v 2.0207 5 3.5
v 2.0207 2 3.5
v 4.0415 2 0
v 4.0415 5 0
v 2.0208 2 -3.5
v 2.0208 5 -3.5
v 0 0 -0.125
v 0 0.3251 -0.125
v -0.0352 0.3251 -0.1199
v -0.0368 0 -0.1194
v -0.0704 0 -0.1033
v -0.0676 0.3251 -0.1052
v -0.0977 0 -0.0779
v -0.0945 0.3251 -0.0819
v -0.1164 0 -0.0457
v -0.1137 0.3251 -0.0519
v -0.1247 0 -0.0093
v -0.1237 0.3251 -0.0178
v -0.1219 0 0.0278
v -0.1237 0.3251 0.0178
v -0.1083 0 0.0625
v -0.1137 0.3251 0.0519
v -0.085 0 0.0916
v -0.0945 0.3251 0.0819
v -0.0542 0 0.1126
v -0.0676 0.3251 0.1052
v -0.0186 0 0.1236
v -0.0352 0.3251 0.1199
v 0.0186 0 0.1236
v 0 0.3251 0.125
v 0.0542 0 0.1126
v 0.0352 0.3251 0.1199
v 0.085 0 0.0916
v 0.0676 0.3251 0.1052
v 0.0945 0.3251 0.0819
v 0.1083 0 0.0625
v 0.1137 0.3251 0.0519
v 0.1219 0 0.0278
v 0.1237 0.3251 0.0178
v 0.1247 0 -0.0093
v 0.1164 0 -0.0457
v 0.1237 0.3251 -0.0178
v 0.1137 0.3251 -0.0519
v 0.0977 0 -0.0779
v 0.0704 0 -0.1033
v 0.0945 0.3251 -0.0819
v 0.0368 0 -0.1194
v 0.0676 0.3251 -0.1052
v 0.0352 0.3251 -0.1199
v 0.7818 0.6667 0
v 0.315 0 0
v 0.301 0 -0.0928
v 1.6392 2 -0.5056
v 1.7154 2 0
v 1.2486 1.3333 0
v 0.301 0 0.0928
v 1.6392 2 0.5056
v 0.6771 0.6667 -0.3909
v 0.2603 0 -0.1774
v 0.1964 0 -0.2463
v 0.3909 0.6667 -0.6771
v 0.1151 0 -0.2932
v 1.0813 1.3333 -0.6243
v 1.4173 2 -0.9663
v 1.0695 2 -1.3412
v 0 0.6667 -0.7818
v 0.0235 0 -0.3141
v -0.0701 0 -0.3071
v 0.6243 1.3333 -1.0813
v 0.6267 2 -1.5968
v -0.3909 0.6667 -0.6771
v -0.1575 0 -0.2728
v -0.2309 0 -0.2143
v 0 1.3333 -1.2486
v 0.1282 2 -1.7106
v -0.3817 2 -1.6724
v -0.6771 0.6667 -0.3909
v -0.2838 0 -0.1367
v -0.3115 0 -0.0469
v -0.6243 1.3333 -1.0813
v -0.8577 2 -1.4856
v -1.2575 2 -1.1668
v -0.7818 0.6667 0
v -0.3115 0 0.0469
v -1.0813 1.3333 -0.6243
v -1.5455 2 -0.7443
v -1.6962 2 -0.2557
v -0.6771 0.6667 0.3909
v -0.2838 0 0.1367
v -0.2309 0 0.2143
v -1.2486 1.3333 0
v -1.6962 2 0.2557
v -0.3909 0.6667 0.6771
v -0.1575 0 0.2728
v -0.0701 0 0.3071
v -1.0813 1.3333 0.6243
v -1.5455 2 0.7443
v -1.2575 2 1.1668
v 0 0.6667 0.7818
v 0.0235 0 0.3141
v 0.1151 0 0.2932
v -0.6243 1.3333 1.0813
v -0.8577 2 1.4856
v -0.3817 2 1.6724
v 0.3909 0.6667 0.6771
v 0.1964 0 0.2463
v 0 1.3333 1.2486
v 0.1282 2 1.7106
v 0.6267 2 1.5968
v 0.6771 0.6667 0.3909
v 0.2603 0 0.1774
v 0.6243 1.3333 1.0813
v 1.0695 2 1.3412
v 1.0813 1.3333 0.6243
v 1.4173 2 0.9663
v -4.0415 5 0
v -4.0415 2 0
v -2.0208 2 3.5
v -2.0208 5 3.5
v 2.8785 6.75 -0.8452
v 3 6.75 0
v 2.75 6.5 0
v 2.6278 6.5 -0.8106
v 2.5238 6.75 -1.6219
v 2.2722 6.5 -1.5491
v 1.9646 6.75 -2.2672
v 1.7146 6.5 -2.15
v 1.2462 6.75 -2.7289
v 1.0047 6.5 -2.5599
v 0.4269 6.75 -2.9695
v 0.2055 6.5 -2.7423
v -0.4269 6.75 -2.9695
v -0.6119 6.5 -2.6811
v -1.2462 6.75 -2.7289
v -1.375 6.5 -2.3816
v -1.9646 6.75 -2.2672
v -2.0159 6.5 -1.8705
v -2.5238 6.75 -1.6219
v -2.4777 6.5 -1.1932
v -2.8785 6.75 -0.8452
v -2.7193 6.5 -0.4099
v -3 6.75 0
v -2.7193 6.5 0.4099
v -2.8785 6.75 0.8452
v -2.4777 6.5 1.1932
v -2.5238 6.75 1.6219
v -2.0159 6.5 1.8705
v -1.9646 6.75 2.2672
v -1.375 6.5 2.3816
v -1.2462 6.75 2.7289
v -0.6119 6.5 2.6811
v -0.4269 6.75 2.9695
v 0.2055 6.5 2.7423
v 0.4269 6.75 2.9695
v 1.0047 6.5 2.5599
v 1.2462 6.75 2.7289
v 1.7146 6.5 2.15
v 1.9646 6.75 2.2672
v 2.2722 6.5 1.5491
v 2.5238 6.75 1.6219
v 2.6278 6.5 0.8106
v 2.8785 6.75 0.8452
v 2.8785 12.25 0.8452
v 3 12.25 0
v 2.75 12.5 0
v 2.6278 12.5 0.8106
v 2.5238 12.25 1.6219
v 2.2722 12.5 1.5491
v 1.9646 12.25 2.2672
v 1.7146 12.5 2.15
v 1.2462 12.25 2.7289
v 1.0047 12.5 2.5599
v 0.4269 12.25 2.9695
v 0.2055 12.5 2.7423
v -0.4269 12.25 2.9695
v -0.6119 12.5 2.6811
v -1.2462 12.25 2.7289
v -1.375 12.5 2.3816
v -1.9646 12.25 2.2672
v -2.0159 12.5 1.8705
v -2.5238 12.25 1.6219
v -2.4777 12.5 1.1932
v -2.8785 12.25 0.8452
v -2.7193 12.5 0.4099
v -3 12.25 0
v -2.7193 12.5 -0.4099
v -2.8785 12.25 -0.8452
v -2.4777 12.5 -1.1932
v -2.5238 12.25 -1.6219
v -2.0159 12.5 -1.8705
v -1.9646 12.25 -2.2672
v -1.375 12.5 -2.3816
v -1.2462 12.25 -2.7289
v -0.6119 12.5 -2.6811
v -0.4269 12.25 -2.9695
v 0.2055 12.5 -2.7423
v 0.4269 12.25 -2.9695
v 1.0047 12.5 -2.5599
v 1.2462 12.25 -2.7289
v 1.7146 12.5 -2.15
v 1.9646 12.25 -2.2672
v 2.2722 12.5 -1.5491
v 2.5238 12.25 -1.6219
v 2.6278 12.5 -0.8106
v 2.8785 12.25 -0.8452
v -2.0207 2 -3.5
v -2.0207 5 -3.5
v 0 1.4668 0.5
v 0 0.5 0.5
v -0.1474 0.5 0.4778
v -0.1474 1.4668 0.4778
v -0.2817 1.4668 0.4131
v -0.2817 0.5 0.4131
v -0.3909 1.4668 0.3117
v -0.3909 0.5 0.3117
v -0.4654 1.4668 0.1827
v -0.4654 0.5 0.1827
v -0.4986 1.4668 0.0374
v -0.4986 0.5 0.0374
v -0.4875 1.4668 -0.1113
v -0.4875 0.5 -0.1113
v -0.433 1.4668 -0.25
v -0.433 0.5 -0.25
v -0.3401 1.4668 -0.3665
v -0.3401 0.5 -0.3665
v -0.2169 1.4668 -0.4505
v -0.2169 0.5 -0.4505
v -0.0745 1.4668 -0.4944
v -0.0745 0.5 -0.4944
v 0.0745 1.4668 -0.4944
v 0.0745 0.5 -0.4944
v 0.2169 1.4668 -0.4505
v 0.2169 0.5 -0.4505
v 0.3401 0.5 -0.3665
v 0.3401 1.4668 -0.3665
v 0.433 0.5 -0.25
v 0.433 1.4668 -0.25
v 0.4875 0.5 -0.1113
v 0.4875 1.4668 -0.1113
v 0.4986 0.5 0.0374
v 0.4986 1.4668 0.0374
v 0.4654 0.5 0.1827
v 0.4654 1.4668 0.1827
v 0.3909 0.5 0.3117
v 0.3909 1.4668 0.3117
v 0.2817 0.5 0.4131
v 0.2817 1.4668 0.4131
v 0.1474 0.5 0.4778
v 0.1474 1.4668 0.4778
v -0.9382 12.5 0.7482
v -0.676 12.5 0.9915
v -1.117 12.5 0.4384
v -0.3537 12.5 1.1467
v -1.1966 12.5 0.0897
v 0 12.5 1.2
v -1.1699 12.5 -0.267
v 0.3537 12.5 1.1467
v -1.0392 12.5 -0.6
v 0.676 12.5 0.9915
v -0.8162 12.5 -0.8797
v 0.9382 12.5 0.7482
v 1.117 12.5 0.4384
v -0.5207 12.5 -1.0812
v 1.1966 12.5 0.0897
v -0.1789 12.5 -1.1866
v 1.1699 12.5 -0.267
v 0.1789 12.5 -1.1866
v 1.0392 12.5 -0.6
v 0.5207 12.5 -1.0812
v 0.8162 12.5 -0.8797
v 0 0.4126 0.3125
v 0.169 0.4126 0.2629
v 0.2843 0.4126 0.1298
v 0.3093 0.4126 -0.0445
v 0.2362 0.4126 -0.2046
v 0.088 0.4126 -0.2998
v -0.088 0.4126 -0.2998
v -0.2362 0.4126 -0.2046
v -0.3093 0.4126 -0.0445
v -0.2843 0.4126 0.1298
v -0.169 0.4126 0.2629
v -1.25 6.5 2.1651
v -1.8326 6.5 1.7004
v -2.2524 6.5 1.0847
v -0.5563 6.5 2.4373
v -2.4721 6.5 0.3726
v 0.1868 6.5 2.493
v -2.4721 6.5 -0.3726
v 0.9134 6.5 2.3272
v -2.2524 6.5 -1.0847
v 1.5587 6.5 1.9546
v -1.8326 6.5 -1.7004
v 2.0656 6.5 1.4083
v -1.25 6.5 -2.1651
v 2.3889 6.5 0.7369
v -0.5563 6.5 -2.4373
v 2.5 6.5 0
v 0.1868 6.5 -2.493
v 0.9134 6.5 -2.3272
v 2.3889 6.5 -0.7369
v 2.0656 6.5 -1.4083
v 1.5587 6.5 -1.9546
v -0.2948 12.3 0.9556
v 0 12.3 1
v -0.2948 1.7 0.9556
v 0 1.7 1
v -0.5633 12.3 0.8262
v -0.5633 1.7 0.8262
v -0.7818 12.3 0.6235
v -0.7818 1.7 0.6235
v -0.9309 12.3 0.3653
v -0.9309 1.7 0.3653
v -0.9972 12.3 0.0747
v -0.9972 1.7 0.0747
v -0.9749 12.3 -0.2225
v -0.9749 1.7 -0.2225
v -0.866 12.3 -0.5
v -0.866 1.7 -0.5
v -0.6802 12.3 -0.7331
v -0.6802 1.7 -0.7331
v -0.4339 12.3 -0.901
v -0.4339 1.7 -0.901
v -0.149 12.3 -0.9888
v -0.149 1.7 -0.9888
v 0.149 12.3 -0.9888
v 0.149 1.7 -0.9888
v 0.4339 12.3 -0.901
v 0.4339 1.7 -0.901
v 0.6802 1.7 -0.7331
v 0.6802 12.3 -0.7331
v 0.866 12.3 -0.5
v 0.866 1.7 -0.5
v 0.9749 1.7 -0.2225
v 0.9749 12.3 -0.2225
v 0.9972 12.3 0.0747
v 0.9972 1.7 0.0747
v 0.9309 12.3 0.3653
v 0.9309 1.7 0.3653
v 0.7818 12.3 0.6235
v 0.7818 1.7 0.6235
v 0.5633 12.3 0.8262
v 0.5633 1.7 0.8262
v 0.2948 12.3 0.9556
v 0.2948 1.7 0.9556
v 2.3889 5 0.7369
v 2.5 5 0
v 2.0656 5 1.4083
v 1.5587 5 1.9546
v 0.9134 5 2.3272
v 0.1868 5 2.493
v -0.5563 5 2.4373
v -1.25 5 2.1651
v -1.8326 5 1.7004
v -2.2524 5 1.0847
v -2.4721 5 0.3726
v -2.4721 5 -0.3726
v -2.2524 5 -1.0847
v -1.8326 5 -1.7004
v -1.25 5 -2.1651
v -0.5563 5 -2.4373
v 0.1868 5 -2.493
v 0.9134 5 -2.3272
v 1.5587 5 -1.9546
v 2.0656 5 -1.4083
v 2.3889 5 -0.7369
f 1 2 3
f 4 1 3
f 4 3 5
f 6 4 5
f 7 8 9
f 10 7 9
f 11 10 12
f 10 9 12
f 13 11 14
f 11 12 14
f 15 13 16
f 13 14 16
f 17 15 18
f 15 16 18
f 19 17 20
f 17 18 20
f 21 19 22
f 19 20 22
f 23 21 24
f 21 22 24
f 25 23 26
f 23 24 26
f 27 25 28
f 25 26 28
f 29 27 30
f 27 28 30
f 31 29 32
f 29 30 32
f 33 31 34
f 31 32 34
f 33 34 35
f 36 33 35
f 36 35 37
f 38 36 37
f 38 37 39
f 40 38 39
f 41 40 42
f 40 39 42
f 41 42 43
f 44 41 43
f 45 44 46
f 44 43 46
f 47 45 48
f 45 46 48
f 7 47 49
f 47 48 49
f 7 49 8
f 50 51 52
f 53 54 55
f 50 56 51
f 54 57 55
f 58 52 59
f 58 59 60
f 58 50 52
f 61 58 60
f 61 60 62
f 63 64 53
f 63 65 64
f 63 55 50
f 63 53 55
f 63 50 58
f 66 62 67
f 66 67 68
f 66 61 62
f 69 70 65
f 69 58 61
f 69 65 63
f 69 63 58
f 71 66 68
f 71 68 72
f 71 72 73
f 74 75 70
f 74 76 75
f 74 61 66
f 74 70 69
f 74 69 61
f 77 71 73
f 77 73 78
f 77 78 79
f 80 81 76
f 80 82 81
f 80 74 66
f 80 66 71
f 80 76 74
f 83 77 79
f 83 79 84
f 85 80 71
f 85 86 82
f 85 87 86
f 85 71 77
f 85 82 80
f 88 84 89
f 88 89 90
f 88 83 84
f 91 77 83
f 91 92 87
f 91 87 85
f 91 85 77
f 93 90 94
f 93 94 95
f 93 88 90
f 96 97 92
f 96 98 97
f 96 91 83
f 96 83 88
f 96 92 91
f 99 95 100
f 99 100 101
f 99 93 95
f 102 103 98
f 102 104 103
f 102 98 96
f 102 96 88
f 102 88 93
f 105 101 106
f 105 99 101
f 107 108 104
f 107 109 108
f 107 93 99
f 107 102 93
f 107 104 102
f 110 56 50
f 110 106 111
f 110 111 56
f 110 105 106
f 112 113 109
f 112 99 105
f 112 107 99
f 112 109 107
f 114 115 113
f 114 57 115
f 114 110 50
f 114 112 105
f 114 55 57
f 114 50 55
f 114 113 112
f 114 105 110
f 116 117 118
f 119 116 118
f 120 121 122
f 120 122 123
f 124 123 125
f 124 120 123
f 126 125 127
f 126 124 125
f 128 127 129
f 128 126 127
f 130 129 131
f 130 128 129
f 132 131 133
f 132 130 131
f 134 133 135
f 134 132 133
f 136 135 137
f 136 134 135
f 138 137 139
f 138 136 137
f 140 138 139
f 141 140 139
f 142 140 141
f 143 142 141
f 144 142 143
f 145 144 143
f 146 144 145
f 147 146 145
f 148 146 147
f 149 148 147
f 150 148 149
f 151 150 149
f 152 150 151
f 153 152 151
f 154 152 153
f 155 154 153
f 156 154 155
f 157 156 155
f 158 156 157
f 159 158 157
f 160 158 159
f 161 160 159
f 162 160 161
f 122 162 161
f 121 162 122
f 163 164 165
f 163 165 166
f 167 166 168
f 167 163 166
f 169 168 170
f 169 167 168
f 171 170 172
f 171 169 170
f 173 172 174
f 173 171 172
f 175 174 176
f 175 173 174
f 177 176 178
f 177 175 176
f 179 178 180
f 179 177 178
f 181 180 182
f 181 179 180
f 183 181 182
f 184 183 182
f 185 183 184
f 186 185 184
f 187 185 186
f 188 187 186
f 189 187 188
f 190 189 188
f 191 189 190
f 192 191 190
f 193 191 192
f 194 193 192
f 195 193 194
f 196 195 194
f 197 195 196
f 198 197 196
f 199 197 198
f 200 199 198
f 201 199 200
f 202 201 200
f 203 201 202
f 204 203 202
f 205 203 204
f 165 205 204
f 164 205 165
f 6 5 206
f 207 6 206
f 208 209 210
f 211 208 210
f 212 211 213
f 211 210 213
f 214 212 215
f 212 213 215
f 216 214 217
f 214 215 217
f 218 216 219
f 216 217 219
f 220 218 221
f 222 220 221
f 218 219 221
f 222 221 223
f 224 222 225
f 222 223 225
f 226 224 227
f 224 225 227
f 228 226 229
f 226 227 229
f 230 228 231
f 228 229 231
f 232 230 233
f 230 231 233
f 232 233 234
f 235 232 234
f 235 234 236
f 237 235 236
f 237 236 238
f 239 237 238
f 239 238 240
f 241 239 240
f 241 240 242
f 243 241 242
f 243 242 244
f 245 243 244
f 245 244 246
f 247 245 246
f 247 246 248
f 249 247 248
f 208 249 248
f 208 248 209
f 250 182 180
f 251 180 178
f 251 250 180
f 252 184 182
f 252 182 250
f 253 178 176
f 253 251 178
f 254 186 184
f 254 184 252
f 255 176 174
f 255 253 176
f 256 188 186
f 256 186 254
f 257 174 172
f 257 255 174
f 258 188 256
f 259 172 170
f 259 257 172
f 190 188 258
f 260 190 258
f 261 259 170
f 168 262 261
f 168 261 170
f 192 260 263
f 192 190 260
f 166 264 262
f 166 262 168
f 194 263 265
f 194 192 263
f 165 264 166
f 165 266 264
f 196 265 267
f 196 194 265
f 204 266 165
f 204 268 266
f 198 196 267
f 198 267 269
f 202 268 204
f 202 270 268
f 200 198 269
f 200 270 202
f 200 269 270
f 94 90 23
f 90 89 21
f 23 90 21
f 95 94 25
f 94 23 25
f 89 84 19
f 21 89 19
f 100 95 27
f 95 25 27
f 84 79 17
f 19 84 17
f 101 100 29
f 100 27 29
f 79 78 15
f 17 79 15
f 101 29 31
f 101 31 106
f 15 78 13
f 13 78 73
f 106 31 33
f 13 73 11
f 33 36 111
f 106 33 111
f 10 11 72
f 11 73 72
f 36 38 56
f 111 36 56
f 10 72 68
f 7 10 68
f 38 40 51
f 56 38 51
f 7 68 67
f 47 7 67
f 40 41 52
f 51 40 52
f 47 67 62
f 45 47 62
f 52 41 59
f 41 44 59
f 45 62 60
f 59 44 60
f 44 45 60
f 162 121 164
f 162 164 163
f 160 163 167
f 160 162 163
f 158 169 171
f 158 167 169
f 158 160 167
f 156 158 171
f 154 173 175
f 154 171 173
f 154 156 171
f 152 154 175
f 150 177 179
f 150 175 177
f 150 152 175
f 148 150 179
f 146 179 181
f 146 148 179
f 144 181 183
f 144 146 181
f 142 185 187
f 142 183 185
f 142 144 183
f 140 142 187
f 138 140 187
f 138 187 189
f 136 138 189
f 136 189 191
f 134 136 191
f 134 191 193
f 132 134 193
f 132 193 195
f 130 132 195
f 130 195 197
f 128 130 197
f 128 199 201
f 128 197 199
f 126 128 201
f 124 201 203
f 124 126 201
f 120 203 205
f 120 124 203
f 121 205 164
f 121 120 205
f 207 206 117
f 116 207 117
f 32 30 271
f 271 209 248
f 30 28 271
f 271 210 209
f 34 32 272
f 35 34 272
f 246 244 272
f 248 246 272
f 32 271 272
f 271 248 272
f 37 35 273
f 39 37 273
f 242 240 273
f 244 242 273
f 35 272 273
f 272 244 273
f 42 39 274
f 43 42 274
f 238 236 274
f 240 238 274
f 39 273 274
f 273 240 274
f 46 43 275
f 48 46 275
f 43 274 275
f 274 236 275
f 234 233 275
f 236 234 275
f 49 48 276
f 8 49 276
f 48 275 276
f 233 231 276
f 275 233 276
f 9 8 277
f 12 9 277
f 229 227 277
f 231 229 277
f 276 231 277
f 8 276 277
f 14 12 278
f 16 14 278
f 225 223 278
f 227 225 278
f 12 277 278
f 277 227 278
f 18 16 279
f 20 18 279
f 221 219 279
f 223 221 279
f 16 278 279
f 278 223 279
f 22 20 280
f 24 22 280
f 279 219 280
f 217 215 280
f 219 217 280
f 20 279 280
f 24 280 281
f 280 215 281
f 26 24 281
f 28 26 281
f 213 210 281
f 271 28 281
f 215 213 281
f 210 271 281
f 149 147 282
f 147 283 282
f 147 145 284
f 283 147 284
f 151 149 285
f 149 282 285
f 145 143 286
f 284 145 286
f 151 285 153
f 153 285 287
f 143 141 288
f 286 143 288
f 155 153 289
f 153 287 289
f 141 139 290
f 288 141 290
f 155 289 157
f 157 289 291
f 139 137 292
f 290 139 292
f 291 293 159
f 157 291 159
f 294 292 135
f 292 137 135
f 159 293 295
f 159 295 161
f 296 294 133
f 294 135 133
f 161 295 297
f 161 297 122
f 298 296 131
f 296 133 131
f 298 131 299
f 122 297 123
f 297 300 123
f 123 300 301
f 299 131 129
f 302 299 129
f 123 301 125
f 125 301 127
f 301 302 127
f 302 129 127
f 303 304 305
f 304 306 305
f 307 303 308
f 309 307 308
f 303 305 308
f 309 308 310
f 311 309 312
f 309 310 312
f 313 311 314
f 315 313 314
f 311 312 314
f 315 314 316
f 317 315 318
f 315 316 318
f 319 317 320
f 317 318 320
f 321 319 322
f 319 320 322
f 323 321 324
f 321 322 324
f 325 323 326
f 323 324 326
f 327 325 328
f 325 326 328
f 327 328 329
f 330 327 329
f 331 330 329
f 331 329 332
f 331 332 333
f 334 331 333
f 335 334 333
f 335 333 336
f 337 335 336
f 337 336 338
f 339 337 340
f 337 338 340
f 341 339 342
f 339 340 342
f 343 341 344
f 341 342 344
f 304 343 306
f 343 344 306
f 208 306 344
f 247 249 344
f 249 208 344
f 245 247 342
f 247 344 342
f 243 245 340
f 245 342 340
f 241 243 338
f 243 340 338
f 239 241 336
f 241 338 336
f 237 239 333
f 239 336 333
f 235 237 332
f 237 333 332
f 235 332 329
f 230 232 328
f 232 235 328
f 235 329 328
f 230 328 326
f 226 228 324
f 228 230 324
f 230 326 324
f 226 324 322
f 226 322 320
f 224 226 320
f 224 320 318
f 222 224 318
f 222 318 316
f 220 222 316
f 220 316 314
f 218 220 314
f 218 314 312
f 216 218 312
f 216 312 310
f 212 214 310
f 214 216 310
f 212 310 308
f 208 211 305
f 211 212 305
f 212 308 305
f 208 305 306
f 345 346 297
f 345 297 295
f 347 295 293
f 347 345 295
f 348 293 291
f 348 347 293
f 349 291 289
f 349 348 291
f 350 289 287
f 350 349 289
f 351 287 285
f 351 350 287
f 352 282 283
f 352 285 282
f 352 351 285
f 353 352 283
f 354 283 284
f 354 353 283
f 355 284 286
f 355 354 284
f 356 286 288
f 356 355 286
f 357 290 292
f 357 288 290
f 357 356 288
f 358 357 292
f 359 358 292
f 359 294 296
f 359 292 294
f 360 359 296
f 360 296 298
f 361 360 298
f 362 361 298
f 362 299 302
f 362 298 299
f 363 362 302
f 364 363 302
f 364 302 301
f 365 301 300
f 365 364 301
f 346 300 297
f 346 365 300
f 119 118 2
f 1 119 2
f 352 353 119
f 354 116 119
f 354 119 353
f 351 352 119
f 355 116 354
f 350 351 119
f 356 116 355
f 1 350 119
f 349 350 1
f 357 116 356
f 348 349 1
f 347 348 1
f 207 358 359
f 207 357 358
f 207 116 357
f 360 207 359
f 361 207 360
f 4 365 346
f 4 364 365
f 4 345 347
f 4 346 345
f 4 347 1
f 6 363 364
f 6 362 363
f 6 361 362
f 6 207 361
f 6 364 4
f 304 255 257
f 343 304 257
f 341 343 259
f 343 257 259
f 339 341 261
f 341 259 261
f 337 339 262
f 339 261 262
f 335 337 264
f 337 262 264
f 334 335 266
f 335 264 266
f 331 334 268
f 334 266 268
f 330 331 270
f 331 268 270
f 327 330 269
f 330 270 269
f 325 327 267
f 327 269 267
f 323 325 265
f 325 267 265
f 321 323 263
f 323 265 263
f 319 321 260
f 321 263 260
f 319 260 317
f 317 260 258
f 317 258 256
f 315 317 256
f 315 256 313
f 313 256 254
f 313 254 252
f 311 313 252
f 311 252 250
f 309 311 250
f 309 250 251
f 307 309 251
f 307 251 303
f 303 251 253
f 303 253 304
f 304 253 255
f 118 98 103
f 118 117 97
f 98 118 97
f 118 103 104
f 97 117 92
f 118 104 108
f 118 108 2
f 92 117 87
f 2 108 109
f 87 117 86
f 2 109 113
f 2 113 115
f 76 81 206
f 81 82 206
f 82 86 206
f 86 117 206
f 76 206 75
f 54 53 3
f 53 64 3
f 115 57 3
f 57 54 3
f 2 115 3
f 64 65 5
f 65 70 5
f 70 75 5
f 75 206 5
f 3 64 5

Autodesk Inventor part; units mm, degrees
ref_plane "YZ Plane" through (0, 0, 0) normal (1, 0, 0) x (0, 1, 0)
ref_plane "XZ Plane" through (0, 0, 0) normal (0, 1, 0) x (-1, 0, 0)
ref_plane "XY Plane" through (0, 0, 0) normal (0, 0, 1) x (1, 0, 0)
sketch "Эскиз1" plane through (0, 0, 0) normal (0, 0, 1) x (1, 0, 0)
  line L0 (0, 0) -> (0, 15)
  line L1 (0, 12.5) -> (3, 12.5)
  line L2 (1.7154, 2) -> (4.0415, 2)
  line L3 (2.5, 5) -> (4.0415, 5)
  line L4 (2.5, 6.5) -> (3, 6.5)
  line L5 (0, 0) -> (0.315, 0)
  line L6 (2.5, 6.5) -> (2.5, 5)
  line L7 (3, 12.5) -> (3, 6.5)
  line L8 (0.315, 0) -> (1.7154, 2)
  line L9 (4.0415, 5) -> (4.0415, 2)
  line L10 (0, 12.5) -> (0, 0)
  dimension "d0" = 15
  dimension "d1" = 12.5
  dimension "d2" = 10.5
  dimension "d3" = 7.5
  dimension "d4" = 6
  dimension "d6" = 5
  dimension "d7" = 6
  dimension "d8" = 125
  dimension "d11" = 8.083
  dimension "d44" = 0.63
revolve "Вращение1" add sketch "Эскиз1" angle 360 about axis through (0, 0, 0) along (0, 1, 0)
chamfer "Фаска1" distance 0.25 angle 45 2 edges at (-3, 12.5, 0) (-3, 6.5, 0)
thread "Резьба1" size "M6x1" class "6g" standard "ANSI Metric M Profile" full length
sketch "Эскиз2" plane through (0, 12.5, 0) normal (0, 1, 0) x (1, 0, 0)
  point P0 (0, 0)
  point P1 (0, 0)
sketch "Эскиз3" plane through (0, 0, 0) normal (0, -1, 0) x (1, 0, 0)
  point P0 (0, 0)
  point P1 (0, 0)
hole "Отверстие1" at (0, 12.5, 0) direction (0, -1, 0) diameter 1 depth 12 tip angle 130
hole "Отверстие2" at (0, 12.5, 0) direction (0, -1, 0) diameter 2 depth 10.8 tip angle 130
chamfer "Фаска2" distance 0.2 angle 45 1 edges at (0, 12.5, -1)
hole "Отверстие3" at (0, 0, 0) direction (0, 1, 0) diameter 0.25 depth 0.5
sketch "Эскиз4" plane through (0, 2, 0) normal (0, -1, 0) x (1, 0, 0)
  circle A0 centre (0, 0) radius 0.125 projected
  circle A1 centre (0, 0) radius 4.0415 projected
  line L0 (4.0415, 0) -> (2.0208, -3.5)
  line L1 (2.0208, -3.5) -> (-2.0207, -3.5)
  line L2 (-2.0207, -3.5) -> (-4.0415, 0)
  line L3 (-4.0415, 0) -> (-2.0208, 3.5)
  line L4 (-2.0208, 3.5) -> (2.0207, 3.5)
  line L5 (2.0207, 3.5) -> (4.0415, 0)
extrude "Выдавливание1" cut sketch "Эскиз4" against normal blind 3 contours L5 A1 | A1 L0 | L4 A1 | A1 L1 | L3 A1 | A1 L2
properties part number "nozzle-0,25"
